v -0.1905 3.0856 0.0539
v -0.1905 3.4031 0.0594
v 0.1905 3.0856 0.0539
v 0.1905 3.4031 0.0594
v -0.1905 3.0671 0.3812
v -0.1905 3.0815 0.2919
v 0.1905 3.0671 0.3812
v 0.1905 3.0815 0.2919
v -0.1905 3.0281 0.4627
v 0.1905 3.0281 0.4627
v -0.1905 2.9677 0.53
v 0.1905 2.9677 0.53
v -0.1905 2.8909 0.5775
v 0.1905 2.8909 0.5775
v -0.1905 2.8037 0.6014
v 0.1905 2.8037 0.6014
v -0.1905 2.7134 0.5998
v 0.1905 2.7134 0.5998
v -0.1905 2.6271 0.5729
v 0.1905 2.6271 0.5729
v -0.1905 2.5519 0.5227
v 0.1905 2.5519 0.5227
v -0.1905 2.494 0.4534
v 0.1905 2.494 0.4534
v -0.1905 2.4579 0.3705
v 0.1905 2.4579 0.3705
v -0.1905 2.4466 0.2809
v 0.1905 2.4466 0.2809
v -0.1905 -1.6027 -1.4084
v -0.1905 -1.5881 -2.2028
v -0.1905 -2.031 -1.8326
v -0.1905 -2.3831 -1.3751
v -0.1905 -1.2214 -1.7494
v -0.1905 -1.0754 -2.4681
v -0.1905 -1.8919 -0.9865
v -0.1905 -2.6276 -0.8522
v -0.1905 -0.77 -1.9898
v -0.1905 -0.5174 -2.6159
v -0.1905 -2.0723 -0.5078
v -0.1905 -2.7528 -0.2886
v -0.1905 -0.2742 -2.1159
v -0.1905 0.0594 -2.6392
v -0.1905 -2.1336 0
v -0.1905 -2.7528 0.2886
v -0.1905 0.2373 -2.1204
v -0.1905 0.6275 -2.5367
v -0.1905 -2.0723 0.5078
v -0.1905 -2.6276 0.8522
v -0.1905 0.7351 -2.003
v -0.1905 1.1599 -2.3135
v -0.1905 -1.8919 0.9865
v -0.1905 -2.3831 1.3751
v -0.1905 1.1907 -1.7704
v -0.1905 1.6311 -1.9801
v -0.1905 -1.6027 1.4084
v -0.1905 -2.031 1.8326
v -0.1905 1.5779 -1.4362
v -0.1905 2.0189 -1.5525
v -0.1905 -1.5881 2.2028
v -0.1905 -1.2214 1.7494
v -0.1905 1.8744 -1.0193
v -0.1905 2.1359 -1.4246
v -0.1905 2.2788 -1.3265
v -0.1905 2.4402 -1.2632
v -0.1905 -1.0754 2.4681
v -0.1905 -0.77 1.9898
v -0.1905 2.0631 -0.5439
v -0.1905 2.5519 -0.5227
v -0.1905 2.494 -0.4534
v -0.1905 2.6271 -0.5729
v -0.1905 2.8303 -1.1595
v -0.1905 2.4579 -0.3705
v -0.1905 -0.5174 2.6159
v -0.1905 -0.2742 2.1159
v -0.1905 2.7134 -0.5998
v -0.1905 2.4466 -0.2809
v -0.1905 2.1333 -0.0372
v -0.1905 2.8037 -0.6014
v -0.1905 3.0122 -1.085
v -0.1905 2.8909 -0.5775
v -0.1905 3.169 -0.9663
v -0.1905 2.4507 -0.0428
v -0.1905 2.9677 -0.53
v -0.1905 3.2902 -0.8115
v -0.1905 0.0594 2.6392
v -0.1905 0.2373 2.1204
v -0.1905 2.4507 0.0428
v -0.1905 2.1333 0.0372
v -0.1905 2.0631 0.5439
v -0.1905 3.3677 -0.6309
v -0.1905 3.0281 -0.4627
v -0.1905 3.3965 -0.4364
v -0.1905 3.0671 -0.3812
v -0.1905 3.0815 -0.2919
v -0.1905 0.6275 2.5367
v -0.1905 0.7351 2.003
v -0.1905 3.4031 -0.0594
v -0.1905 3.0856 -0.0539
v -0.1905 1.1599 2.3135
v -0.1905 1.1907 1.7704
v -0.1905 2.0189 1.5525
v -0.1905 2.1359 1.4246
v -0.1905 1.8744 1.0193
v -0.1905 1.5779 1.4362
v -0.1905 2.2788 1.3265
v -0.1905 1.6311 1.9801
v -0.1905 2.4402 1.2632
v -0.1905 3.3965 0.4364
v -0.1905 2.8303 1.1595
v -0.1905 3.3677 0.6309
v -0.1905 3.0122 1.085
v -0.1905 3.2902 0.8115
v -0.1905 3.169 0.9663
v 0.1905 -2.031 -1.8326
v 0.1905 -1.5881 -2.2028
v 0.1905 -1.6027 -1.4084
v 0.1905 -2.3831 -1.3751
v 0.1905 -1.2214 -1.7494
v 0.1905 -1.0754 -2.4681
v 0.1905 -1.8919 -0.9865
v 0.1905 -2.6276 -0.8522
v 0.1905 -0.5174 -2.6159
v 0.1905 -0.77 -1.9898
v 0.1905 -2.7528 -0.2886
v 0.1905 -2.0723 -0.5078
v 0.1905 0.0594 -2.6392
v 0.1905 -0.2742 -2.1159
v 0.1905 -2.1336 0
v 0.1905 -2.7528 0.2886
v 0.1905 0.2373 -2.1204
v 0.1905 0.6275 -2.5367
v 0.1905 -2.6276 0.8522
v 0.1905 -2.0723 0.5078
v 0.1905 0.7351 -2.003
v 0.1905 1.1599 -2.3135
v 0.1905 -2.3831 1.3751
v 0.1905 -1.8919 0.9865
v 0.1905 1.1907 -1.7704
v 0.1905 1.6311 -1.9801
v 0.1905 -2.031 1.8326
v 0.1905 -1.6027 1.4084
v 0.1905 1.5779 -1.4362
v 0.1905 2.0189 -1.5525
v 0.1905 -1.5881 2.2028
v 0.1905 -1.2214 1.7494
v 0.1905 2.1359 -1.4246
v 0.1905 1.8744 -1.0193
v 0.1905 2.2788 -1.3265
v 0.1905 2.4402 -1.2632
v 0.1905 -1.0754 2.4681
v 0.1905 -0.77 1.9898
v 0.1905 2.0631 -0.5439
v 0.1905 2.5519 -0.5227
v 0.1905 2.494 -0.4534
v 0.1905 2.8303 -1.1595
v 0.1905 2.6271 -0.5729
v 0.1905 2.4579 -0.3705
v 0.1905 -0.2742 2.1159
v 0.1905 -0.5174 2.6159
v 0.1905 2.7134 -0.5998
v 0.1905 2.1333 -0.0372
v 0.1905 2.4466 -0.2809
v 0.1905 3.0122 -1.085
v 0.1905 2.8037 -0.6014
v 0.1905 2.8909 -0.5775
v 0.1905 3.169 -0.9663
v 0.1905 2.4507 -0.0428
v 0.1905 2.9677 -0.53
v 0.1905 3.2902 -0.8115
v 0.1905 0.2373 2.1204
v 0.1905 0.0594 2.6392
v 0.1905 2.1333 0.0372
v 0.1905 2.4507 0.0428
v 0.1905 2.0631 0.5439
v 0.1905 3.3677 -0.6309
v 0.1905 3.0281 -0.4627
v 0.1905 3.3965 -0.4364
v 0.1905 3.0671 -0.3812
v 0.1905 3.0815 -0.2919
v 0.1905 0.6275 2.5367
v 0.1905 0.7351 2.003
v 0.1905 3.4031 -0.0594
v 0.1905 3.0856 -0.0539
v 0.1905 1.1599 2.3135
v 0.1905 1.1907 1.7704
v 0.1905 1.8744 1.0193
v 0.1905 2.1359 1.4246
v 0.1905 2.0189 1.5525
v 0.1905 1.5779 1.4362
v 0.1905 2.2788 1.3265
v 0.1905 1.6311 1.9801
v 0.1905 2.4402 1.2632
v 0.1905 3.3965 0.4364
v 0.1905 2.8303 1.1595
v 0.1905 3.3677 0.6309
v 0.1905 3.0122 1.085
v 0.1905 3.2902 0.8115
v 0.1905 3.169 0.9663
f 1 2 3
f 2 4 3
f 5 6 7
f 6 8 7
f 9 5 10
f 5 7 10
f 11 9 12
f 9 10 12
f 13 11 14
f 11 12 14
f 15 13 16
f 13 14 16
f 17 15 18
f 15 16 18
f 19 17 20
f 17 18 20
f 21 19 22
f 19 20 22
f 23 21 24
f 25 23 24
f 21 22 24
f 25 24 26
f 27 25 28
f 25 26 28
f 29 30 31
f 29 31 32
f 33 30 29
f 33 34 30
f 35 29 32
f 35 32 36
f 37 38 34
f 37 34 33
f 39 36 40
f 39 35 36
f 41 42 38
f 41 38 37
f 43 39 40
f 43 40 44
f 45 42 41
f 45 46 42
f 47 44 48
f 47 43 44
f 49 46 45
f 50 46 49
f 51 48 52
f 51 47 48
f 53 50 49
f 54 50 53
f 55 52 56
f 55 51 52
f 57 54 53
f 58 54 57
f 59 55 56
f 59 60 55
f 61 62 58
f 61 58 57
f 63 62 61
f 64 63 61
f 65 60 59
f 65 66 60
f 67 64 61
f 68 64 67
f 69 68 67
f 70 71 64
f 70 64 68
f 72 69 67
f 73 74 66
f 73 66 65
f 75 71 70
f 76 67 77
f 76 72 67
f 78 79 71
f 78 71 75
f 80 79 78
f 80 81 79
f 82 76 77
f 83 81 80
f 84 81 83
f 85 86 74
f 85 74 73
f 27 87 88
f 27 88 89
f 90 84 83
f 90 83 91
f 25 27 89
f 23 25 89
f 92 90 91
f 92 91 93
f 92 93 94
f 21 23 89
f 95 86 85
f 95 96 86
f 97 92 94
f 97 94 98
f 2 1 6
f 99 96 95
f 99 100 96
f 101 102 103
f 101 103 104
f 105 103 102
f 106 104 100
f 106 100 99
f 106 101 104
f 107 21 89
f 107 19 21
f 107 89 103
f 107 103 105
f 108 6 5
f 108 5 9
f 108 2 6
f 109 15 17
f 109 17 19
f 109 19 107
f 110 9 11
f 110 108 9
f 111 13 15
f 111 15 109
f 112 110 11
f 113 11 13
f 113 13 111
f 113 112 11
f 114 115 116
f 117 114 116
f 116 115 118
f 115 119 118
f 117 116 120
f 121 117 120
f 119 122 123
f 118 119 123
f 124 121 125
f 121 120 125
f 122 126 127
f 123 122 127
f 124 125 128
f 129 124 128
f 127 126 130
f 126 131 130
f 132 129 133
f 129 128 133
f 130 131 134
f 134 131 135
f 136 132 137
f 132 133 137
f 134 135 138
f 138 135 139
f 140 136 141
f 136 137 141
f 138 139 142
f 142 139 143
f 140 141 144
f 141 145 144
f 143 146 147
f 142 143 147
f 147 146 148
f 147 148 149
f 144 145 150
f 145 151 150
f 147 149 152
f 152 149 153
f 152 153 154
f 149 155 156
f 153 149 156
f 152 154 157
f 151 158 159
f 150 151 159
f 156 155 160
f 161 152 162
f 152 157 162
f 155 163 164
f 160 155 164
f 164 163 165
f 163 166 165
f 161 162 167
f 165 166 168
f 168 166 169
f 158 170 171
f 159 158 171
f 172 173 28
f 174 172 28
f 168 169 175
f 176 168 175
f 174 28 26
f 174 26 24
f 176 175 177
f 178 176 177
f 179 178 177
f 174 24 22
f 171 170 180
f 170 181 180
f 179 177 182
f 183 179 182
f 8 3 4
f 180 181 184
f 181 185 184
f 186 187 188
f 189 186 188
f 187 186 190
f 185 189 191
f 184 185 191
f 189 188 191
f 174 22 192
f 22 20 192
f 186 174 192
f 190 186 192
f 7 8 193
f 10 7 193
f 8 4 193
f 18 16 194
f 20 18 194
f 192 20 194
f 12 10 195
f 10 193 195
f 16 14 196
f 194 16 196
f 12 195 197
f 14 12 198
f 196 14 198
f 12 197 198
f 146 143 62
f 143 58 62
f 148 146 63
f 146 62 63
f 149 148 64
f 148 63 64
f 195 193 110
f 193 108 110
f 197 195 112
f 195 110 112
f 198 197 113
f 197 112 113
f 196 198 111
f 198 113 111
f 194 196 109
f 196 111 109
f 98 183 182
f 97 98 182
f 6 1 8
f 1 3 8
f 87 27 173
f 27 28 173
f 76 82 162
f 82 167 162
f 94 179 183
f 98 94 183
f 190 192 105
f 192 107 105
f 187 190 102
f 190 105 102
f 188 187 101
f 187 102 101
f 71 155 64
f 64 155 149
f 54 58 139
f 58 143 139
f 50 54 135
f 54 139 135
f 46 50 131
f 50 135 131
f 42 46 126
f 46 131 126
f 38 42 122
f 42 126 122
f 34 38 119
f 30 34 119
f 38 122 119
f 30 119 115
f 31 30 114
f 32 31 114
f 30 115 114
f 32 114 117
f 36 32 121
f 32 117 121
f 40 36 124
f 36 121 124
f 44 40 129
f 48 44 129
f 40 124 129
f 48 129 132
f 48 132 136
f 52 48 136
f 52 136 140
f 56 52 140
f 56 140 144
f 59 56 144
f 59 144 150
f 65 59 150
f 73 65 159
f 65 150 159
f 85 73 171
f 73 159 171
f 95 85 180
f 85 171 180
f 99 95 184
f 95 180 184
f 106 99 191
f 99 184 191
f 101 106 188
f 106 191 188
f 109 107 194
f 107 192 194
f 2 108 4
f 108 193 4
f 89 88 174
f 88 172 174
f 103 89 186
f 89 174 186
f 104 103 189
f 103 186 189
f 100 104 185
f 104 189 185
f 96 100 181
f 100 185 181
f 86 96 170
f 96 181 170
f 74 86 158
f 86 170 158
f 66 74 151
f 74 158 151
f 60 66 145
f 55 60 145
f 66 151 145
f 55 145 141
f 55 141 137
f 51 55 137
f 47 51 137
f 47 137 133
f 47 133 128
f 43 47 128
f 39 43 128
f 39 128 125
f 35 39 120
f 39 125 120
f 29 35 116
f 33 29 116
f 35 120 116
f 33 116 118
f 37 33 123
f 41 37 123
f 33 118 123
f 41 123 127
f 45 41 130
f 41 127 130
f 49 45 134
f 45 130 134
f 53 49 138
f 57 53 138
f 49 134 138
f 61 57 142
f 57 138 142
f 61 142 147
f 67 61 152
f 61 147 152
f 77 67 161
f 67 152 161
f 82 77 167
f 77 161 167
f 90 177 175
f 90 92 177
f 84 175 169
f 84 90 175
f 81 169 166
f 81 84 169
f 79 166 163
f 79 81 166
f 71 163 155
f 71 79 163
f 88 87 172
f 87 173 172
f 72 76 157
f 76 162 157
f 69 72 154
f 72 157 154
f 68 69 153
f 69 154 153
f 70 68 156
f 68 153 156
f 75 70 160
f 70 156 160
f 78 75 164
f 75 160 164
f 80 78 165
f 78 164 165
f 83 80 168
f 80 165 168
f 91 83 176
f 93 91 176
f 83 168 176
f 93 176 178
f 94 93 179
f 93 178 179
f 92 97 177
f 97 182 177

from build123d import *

# Parameters (mm, degrees)
EXTRUDE1_DEPTH = 0.1905
FILLET1_R      = 0.762


with BuildPart() as part:
    # Sketch1 → Extrude1 (new body, symmetric)
    with BuildSketch(Plane(origin=(0, 0, 0), x_dir=(0, 0, -1), z_dir=(1, 0, 0))):
        with BuildLine():
            Line((0.059401011, 3.403081615), (1.01175594, 3.386458198))
            Line((1.01175594, 3.386458198), (1.337932753, 2.159059043))
            ThreePointArc((1.337932753, 2.159059043), (0, -2.7686), (-1.337932753, 2.159059043))
            Line((-1.337932753, 2.159059043), (-1.01175594, 3.386458198))
            Line((-1.01175594, 3.386458198), (-0.059401011, 3.403081615))
            Line((-0.059401011, 3.403081615), (-0.053859872, 3.085629972))
            Line((-0.053859872, 3.085629972), (-0.291948604, 3.081474118))
            ThreePointArc((-0.291948604, 3.081474118), (-0.603859108, 2.758481335), (-0.280866326, 2.446570831))
            Line((-0.280866326, 2.446570831), (-0.042777593, 2.450726686))
            Line((-0.042777593, 2.450726686), (-0.037236454, 2.133275042))
            ThreePointArc((-0.037236454, 2.133275042), (0, -2.1336), (0.037236454, 2.133275042))
            Line((0.037236454, 2.133275042), (0.042777593, 2.450726686))
            Line((0.042777593, 2.450726686), (0.280866326, 2.446570831))
            ThreePointArc((0.280866326, 2.446570831), (0.603859108, 2.758481335), (0.291948604, 3.081474118))
            Line((0.291948604, 3.081474118), (0.053859872, 3.085629972))
            Line((0.053859872, 3.085629972), (0.059401011, 3.403081615))
        make_face()
    extrude(amount=EXTRUDE1_DEPTH, both=True)

    # Fillet1
    fillet1_edges = [part.edges().sort_by_distance(p)[0] for p in [
        (0, 3.386458198, -1.01175594),
        (0, 2.159059043, -1.337932753),
        (0, 2.159059043, 1.337932753),
        (0, 3.386458198, 1.01175594),
    ]]
    fillet(fillet1_edges, radius=FILLET1_R)


solid = part.part
